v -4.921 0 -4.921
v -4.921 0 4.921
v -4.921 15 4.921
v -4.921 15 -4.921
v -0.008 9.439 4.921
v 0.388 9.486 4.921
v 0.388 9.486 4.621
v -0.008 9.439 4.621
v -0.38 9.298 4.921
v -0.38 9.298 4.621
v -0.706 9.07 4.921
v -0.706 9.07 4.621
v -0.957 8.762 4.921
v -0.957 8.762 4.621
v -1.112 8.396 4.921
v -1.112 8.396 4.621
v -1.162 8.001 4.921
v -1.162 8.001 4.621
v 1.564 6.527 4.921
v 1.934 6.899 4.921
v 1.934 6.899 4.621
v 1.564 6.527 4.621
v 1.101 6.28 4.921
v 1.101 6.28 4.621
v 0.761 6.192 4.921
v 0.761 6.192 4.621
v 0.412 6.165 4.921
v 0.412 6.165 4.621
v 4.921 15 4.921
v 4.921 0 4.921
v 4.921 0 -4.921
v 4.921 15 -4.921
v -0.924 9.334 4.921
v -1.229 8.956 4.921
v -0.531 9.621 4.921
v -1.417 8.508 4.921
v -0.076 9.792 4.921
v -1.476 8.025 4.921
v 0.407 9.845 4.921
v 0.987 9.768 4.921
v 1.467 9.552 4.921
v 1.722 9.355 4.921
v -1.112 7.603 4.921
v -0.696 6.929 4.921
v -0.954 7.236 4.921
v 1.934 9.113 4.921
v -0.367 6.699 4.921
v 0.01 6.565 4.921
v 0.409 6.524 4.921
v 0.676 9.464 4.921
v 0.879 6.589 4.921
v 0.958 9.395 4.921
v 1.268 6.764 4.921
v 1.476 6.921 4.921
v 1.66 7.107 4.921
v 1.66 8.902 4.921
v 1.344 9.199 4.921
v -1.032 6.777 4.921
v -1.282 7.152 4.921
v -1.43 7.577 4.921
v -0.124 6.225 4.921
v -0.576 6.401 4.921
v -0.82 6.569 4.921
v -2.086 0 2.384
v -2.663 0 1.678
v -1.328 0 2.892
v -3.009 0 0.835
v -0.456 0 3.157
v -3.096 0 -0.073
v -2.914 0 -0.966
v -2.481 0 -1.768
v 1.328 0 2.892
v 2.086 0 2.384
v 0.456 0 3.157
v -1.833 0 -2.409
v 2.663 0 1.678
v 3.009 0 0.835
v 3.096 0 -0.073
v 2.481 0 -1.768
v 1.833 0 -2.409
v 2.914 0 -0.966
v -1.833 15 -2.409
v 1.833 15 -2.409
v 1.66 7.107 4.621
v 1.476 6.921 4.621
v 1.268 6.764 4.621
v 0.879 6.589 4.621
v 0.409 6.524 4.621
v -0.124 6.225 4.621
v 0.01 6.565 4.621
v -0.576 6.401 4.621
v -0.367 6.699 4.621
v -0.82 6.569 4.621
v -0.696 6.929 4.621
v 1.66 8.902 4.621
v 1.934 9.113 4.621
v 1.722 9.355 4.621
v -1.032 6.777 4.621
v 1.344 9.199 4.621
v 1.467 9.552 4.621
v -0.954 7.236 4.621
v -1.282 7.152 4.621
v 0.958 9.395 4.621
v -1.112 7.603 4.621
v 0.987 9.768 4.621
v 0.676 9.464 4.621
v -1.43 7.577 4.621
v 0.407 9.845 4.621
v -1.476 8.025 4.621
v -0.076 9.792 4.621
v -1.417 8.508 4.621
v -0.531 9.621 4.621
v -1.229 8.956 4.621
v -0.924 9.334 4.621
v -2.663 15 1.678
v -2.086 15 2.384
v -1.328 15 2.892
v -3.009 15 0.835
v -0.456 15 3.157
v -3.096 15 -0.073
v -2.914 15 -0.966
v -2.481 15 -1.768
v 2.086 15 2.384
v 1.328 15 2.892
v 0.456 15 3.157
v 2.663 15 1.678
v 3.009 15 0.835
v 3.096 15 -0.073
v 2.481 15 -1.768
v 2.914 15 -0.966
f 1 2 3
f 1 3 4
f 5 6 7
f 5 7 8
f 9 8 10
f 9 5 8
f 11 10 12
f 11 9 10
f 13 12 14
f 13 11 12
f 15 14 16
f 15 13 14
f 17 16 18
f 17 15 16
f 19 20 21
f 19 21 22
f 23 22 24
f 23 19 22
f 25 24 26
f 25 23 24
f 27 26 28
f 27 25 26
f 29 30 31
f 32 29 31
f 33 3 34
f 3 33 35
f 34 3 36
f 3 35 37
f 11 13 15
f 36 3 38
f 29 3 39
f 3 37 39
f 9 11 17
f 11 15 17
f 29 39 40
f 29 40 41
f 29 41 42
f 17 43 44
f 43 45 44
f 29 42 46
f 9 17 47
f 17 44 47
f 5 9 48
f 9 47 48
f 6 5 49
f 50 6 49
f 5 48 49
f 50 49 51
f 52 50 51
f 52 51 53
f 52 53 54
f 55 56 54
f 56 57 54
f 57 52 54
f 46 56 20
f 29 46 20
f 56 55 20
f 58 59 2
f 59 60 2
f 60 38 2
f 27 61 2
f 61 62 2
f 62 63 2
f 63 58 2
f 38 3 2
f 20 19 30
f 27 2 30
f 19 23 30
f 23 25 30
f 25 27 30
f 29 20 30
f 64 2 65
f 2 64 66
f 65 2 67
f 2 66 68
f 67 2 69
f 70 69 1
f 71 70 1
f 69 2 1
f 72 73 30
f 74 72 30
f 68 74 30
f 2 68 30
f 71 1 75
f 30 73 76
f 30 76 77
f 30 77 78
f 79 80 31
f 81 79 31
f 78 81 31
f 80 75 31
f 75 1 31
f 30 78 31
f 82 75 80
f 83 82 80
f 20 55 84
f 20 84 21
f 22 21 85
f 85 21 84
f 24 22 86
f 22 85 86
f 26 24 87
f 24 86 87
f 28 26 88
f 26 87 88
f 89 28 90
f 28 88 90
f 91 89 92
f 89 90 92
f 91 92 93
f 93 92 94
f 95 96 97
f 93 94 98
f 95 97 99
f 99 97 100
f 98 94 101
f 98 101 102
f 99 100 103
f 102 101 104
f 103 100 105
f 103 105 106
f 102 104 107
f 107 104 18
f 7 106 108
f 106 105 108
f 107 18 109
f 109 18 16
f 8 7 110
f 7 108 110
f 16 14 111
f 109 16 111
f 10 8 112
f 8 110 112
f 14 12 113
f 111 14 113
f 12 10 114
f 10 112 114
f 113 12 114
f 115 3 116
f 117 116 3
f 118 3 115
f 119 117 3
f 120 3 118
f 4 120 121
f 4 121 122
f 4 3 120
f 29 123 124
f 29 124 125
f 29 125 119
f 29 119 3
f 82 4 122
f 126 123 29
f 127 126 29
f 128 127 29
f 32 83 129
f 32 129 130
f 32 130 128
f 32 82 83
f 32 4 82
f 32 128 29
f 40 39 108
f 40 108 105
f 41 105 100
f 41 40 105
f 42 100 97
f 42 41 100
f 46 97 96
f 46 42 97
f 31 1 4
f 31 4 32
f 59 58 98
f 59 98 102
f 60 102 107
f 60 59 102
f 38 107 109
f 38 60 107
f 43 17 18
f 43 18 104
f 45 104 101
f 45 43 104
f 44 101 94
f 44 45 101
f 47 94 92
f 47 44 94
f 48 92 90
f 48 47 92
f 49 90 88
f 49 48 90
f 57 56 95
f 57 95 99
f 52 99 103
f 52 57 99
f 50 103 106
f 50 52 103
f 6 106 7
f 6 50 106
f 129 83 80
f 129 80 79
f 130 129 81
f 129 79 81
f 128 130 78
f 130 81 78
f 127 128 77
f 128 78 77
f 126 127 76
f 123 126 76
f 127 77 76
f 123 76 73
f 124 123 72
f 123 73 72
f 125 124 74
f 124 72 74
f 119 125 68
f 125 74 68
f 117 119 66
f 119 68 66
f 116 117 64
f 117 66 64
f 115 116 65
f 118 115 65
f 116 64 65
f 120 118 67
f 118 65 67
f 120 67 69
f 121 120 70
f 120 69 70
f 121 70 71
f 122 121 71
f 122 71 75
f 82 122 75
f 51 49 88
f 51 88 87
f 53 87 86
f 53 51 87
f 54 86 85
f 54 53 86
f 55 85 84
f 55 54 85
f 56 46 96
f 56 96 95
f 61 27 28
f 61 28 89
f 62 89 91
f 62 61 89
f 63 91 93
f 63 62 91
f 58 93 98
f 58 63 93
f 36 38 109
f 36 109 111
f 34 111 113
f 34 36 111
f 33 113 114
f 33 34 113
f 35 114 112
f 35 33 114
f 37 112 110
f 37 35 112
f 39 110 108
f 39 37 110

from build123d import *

# Parameters (mm, degrees)
SKETCH1_W           = 9.84142284
SKETCH1_H           = 9.84142284
BOSS_EXTRUDE1_DEPTH = 15
CUT_EXTRUDE1_DEPTH  = 0.3


with BuildPart() as part:
    # Sketch1 → Boss-Extrude1 (new body)
    with BuildSketch(Plane(origin=(0, 0, 0), x_dir=(1, 0, 0), z_dir=(0, 1, 0))):
        Rectangle(SKETCH1_W, SKETCH1_H)
        with BuildLine():
            Line((-1.833030278, 2.409444822), (1.833030278, 2.409444822))
            ThreePointArc((1.833030278, 2.409444822), (0, -3.190555178), (-1.833030278, 2.409444822))
        make_face(mode=Mode.SUBTRACT)
    extrude(amount=BOSS_EXTRUDE1_DEPTH)

    # Sketch2 → Cut-Extrude1 (cut)
    with BuildSketch(Plane.XY.offset(4.92071142)):
        with BuildLine():
            Line((1.934406803, 9.11261109), (1.659567059, 8.902274552))
            add(Edge.make_bspline(
                [(1.659567059, 8.902274552), (1.639961171, 8.925640522), (1.601013724, 8.972057437), (1.538354521, 9.037236982), (1.473052878, 9.098302243), (1.405133757, 9.155544123), (1.333374638, 9.206960889), (1.259513839, 9.255231992), (1.182315794, 9.29849973), (1.075564059, 9.350962716), (0.935916211, 9.405708871), (0.760121372, 9.451612102), (0.576610273, 9.480833278), (0.451412674, 9.483998119), (0.387732123, 9.485607885)],
                knots=[0, 0, 0, 0, 9.1485e-05, 0.000181737, 0.000271024, 0.000359627, 0.000447979, 0.000535687, 0.000624217, 0.000713268, 0.000892422, 0.00107303, 0.001257466, 0.001448389, 0.001448389, 0.001448389, 0.001448389], degree=3))
            add(Edge.make_bspline(
                [(0.387732123, 9.485607885), (0.352648824, 9.485203923), (0.282807831, 9.484399747), (0.179159358, 9.473790622), (0.077446307, 9.458879412), (-0.02226516, 9.436754088), (-0.119848118, 9.408781469), (-0.21594052, 9.375356055), (-0.30915112, 9.334001215), (-0.400769358, 9.288292956), (-0.488548569, 9.236665511), (-0.571603617, 9.180352159), (-0.649631585, 9.119983062), (-0.722694197, 9.055331956), (-0.790866145, 8.986689996), (-0.853653456, 8.913325654), (-0.910838867, 8.83547348), (-0.963555892, 8.754160073), (-1.010768625, 8.669622281), (-1.050298504, 8.581547211), (-1.085303627, 8.491443108), (-1.113002869, 8.398291947), (-1.134927386, 8.302749181), (-1.150055049, 8.204558393), (-1.160543521, 8.103924714), (-1.161343697, 8.035715401), (-1.161747044, 8.001333045)],
                knots=[0, 0, 0, 0, 0.000105206, 0.000209435, 0.000312261, 0.00041348, 0.000515565, 0.000616682, 0.000718413, 0.000821258, 0.000923708, 0.001023662, 0.001122111, 0.001219464, 0.00131614, 0.001412112, 0.001508869, 0.001605718, 0.001702691, 0.001799013, 0.001895107, 0.001992482, 0.002090281, 0.00218895, 0.002290387, 0.00239349, 0.00239349, 0.00239349, 0.00239349], degree=3))
            add(Edge.make_bspline(
                [(-1.161747044, 8.001333045), (-1.160485225, 7.949601726), (-1.15800781, 7.848034141), (-1.135959476, 7.69926353), (-1.102454385, 7.556742856), (-1.052238808, 7.421363014), (-0.990319757, 7.291454656), (-0.912079146, 7.169215803), (-0.821462609, 7.052799238), (-0.717188189, 6.94495629), (-0.602782373, 6.846442565), (-0.480034462, 6.759691983), (-0.349250174, 6.687377101), (-0.211873544, 6.627201155), (-0.06684743, 6.580944427), (0.085567373, 6.548380303), (0.245039368, 6.527138123), (0.354008768, 6.525104435), (0.409466899, 6.524069424)],
                knots=[0, 0, 0, 0, 0.000155106, 0.000304531, 0.000450265, 0.000593548, 0.000736853, 0.000881182, 0.001028026, 0.001178769, 0.001330408, 0.001480379, 0.001628835, 0.001777978, 0.001929641, 0.002084627, 0.002245075, 0.00241136, 0.00241136, 0.00241136, 0.00241136], degree=3))
            add(Edge.make_bspline(
                [(0.409466899, 6.524069424), (0.470569588, 6.525758203), (0.590834297, 6.529082126), (0.767202323, 6.557241375), (0.936038089, 6.602899293), (1.097350675, 6.666797215), (1.250685321, 6.749862503), (1.396281982, 6.850560381), (1.534263552, 6.969848713), (1.617234834, 7.060931842), (1.659567059, 7.107402757)],
                knots=[0, 0, 0, 0, 0.00018322, 0.00036062, 0.000534275, 0.000707044, 0.000879893, 0.001056289, 0.001237208, 0.001425665, 0.001425665, 0.001425665, 0.001425665], degree=3))
            Line((1.659567059, 7.107402757), (1.934406803, 6.899169584))
            add(Edge.make_bspline(
                [(1.934406803, 6.899169584), (1.912288693, 6.870631132), (1.868158417, 6.813690926), (1.7967004, 6.733419216), (1.721423103, 6.65791518), (1.641767393, 6.587787559), (1.558649601, 6.521633094), (1.470577289, 6.461331262), (1.378708257, 6.406040378), (1.283353778, 6.355413454), (1.184615165, 6.310496207), (1.08261073, 6.272042439), (0.977780154, 6.238917549), (0.870118646, 6.211665612), (0.759402889, 6.190394529), (0.646032415, 6.176174854), (0.52976254, 6.166432939), (0.451321119, 6.165545024), (0.411570264, 6.165095065)],
                knots=[0, 0, 0, 0, 0.000108293, 0.000216068, 0.000322162, 0.000427957, 0.000534281, 0.00064066, 0.000747915, 0.000855806, 0.000964371, 0.001073102, 0.001182643, 0.001294024, 0.001406092, 0.001520624, 0.001636667, 0.001755891, 0.001755891, 0.001755891, 0.001755891], degree=3))
            add(Edge.make_bspline(
                [(0.411570264, 6.165095065), (0.373926597, 6.165357057), (0.299490907, 6.165875115), (0.189592155, 6.174267282), (0.082602575, 6.185717019), (-0.021172051, 6.20295715), (-0.122298026, 6.22330149), (-0.219858611, 6.250572747), (-0.314813821, 6.281121914), (-0.406782162, 6.3170269), (-0.495841862, 6.357543083), (-0.581705673, 6.403334642), (-0.664334105, 6.454016507), (-0.744539526, 6.508471517), (-0.82113711, 6.568448819), (-0.894790635, 6.633115453), (-0.965913112, 6.702253464), (-1.009915797, 6.752108317), (-1.032039512, 6.777174392)],
                knots=[0, 0, 0, 0, 0.0001129, 0.000223246, 0.000330481, 0.000435603, 0.000538732, 0.000639764, 0.000739316, 0.000837878, 0.000935767, 0.001032686, 0.001129604, 0.00122645, 0.001323362, 0.001421241, 0.001520399, 0.001620667, 0.001620667, 0.001620667, 0.001620667], degree=3))
            add(Edge.make_bspline(
                [(-1.032039512, 6.777174392), (-1.067475155, 6.82071558), (-1.137918632, 6.907272291), (-1.228044315, 7.047558272), (-1.305191871, 7.194026481), (-1.367567791, 7.34744641), (-1.416330525, 7.507473797), (-1.45011172, 7.674189311), (-1.472063324, 7.847437254), (-1.474573613, 7.965274042), (-1.475849608, 8.025171186)],
                knots=[0, 0, 0, 0, 0.000168306, 0.00033458, 0.000499224, 0.000664315, 0.00083066, 0.00100034, 0.001174094, 0.001353718, 0.001353718, 0.001353718, 0.001353718], degree=3))
            add(Edge.make_bspline(
                [(-1.475849608, 8.025171186), (-1.474294414, 8.08812664), (-1.471234668, 8.211987565), (-1.445238872, 8.393761518), (-1.403420076, 8.567912917), (-1.344023188, 8.734116661), (-1.268717836, 8.893246942), (-1.175691223, 9.044088146), (-1.06602408, 9.187604946), (-0.940576513, 9.321619697), (-0.803009177, 9.44415905), (-0.655690363, 9.551965254), (-0.498908416, 9.64168277), (-0.334390565, 9.716678932), (-0.160904883, 9.774323395), (0.021178486, 9.814676582), (0.211517401, 9.839793698), (0.341379826, 9.842968906), (0.407363533, 9.844582244)],
                knots=[0, 0, 0, 0, 0.000188789, 0.000371431, 0.000549644, 0.000725278, 0.00089996, 0.001076844, 0.001255917, 0.001440951, 0.001626689, 0.001807878, 0.001987546, 0.002167657, 0.002349462, 0.002534866, 0.002726448, 0.002924344, 0.002924344, 0.002924344, 0.002924344], degree=3))
            add(Edge.make_bspline(
                [(0.407363533, 9.844582244), (0.447578005, 9.844100106), (0.527178503, 9.843145762), (0.644931155, 9.83383962), (0.759573482, 9.818326014), (0.871184464, 9.797209944), (0.98030708, 9.771002622), (1.086107321, 9.736862324), (1.189206008, 9.697825793), (1.288952916, 9.652867327), (1.384869466, 9.602400585), (1.476925785, 9.546984962), (1.564390643, 9.486689156), (1.647879492, 9.422025981), (1.725995703, 9.351627422), (1.800957181, 9.277429826), (1.87021826, 9.197296001), (1.912971455, 9.140891068), (1.934406803, 9.11261109)],
                knots=[0, 0, 0, 0, 0.000120626, 0.000238766, 0.000354085, 0.000467531, 0.000579423, 0.000690512, 0.000800803, 0.000910007, 0.001018518, 0.001125773, 0.001232152, 0.001337058, 0.001442329, 0.001547432, 0.001653292, 0.001759736, 0.001759736, 0.001759736, 0.001759736], degree=3))
        make_face()
    extrude(amount=-CUT_EXTRUDE1_DEPTH, mode=Mode.SUBTRACT)


solid = part.part
